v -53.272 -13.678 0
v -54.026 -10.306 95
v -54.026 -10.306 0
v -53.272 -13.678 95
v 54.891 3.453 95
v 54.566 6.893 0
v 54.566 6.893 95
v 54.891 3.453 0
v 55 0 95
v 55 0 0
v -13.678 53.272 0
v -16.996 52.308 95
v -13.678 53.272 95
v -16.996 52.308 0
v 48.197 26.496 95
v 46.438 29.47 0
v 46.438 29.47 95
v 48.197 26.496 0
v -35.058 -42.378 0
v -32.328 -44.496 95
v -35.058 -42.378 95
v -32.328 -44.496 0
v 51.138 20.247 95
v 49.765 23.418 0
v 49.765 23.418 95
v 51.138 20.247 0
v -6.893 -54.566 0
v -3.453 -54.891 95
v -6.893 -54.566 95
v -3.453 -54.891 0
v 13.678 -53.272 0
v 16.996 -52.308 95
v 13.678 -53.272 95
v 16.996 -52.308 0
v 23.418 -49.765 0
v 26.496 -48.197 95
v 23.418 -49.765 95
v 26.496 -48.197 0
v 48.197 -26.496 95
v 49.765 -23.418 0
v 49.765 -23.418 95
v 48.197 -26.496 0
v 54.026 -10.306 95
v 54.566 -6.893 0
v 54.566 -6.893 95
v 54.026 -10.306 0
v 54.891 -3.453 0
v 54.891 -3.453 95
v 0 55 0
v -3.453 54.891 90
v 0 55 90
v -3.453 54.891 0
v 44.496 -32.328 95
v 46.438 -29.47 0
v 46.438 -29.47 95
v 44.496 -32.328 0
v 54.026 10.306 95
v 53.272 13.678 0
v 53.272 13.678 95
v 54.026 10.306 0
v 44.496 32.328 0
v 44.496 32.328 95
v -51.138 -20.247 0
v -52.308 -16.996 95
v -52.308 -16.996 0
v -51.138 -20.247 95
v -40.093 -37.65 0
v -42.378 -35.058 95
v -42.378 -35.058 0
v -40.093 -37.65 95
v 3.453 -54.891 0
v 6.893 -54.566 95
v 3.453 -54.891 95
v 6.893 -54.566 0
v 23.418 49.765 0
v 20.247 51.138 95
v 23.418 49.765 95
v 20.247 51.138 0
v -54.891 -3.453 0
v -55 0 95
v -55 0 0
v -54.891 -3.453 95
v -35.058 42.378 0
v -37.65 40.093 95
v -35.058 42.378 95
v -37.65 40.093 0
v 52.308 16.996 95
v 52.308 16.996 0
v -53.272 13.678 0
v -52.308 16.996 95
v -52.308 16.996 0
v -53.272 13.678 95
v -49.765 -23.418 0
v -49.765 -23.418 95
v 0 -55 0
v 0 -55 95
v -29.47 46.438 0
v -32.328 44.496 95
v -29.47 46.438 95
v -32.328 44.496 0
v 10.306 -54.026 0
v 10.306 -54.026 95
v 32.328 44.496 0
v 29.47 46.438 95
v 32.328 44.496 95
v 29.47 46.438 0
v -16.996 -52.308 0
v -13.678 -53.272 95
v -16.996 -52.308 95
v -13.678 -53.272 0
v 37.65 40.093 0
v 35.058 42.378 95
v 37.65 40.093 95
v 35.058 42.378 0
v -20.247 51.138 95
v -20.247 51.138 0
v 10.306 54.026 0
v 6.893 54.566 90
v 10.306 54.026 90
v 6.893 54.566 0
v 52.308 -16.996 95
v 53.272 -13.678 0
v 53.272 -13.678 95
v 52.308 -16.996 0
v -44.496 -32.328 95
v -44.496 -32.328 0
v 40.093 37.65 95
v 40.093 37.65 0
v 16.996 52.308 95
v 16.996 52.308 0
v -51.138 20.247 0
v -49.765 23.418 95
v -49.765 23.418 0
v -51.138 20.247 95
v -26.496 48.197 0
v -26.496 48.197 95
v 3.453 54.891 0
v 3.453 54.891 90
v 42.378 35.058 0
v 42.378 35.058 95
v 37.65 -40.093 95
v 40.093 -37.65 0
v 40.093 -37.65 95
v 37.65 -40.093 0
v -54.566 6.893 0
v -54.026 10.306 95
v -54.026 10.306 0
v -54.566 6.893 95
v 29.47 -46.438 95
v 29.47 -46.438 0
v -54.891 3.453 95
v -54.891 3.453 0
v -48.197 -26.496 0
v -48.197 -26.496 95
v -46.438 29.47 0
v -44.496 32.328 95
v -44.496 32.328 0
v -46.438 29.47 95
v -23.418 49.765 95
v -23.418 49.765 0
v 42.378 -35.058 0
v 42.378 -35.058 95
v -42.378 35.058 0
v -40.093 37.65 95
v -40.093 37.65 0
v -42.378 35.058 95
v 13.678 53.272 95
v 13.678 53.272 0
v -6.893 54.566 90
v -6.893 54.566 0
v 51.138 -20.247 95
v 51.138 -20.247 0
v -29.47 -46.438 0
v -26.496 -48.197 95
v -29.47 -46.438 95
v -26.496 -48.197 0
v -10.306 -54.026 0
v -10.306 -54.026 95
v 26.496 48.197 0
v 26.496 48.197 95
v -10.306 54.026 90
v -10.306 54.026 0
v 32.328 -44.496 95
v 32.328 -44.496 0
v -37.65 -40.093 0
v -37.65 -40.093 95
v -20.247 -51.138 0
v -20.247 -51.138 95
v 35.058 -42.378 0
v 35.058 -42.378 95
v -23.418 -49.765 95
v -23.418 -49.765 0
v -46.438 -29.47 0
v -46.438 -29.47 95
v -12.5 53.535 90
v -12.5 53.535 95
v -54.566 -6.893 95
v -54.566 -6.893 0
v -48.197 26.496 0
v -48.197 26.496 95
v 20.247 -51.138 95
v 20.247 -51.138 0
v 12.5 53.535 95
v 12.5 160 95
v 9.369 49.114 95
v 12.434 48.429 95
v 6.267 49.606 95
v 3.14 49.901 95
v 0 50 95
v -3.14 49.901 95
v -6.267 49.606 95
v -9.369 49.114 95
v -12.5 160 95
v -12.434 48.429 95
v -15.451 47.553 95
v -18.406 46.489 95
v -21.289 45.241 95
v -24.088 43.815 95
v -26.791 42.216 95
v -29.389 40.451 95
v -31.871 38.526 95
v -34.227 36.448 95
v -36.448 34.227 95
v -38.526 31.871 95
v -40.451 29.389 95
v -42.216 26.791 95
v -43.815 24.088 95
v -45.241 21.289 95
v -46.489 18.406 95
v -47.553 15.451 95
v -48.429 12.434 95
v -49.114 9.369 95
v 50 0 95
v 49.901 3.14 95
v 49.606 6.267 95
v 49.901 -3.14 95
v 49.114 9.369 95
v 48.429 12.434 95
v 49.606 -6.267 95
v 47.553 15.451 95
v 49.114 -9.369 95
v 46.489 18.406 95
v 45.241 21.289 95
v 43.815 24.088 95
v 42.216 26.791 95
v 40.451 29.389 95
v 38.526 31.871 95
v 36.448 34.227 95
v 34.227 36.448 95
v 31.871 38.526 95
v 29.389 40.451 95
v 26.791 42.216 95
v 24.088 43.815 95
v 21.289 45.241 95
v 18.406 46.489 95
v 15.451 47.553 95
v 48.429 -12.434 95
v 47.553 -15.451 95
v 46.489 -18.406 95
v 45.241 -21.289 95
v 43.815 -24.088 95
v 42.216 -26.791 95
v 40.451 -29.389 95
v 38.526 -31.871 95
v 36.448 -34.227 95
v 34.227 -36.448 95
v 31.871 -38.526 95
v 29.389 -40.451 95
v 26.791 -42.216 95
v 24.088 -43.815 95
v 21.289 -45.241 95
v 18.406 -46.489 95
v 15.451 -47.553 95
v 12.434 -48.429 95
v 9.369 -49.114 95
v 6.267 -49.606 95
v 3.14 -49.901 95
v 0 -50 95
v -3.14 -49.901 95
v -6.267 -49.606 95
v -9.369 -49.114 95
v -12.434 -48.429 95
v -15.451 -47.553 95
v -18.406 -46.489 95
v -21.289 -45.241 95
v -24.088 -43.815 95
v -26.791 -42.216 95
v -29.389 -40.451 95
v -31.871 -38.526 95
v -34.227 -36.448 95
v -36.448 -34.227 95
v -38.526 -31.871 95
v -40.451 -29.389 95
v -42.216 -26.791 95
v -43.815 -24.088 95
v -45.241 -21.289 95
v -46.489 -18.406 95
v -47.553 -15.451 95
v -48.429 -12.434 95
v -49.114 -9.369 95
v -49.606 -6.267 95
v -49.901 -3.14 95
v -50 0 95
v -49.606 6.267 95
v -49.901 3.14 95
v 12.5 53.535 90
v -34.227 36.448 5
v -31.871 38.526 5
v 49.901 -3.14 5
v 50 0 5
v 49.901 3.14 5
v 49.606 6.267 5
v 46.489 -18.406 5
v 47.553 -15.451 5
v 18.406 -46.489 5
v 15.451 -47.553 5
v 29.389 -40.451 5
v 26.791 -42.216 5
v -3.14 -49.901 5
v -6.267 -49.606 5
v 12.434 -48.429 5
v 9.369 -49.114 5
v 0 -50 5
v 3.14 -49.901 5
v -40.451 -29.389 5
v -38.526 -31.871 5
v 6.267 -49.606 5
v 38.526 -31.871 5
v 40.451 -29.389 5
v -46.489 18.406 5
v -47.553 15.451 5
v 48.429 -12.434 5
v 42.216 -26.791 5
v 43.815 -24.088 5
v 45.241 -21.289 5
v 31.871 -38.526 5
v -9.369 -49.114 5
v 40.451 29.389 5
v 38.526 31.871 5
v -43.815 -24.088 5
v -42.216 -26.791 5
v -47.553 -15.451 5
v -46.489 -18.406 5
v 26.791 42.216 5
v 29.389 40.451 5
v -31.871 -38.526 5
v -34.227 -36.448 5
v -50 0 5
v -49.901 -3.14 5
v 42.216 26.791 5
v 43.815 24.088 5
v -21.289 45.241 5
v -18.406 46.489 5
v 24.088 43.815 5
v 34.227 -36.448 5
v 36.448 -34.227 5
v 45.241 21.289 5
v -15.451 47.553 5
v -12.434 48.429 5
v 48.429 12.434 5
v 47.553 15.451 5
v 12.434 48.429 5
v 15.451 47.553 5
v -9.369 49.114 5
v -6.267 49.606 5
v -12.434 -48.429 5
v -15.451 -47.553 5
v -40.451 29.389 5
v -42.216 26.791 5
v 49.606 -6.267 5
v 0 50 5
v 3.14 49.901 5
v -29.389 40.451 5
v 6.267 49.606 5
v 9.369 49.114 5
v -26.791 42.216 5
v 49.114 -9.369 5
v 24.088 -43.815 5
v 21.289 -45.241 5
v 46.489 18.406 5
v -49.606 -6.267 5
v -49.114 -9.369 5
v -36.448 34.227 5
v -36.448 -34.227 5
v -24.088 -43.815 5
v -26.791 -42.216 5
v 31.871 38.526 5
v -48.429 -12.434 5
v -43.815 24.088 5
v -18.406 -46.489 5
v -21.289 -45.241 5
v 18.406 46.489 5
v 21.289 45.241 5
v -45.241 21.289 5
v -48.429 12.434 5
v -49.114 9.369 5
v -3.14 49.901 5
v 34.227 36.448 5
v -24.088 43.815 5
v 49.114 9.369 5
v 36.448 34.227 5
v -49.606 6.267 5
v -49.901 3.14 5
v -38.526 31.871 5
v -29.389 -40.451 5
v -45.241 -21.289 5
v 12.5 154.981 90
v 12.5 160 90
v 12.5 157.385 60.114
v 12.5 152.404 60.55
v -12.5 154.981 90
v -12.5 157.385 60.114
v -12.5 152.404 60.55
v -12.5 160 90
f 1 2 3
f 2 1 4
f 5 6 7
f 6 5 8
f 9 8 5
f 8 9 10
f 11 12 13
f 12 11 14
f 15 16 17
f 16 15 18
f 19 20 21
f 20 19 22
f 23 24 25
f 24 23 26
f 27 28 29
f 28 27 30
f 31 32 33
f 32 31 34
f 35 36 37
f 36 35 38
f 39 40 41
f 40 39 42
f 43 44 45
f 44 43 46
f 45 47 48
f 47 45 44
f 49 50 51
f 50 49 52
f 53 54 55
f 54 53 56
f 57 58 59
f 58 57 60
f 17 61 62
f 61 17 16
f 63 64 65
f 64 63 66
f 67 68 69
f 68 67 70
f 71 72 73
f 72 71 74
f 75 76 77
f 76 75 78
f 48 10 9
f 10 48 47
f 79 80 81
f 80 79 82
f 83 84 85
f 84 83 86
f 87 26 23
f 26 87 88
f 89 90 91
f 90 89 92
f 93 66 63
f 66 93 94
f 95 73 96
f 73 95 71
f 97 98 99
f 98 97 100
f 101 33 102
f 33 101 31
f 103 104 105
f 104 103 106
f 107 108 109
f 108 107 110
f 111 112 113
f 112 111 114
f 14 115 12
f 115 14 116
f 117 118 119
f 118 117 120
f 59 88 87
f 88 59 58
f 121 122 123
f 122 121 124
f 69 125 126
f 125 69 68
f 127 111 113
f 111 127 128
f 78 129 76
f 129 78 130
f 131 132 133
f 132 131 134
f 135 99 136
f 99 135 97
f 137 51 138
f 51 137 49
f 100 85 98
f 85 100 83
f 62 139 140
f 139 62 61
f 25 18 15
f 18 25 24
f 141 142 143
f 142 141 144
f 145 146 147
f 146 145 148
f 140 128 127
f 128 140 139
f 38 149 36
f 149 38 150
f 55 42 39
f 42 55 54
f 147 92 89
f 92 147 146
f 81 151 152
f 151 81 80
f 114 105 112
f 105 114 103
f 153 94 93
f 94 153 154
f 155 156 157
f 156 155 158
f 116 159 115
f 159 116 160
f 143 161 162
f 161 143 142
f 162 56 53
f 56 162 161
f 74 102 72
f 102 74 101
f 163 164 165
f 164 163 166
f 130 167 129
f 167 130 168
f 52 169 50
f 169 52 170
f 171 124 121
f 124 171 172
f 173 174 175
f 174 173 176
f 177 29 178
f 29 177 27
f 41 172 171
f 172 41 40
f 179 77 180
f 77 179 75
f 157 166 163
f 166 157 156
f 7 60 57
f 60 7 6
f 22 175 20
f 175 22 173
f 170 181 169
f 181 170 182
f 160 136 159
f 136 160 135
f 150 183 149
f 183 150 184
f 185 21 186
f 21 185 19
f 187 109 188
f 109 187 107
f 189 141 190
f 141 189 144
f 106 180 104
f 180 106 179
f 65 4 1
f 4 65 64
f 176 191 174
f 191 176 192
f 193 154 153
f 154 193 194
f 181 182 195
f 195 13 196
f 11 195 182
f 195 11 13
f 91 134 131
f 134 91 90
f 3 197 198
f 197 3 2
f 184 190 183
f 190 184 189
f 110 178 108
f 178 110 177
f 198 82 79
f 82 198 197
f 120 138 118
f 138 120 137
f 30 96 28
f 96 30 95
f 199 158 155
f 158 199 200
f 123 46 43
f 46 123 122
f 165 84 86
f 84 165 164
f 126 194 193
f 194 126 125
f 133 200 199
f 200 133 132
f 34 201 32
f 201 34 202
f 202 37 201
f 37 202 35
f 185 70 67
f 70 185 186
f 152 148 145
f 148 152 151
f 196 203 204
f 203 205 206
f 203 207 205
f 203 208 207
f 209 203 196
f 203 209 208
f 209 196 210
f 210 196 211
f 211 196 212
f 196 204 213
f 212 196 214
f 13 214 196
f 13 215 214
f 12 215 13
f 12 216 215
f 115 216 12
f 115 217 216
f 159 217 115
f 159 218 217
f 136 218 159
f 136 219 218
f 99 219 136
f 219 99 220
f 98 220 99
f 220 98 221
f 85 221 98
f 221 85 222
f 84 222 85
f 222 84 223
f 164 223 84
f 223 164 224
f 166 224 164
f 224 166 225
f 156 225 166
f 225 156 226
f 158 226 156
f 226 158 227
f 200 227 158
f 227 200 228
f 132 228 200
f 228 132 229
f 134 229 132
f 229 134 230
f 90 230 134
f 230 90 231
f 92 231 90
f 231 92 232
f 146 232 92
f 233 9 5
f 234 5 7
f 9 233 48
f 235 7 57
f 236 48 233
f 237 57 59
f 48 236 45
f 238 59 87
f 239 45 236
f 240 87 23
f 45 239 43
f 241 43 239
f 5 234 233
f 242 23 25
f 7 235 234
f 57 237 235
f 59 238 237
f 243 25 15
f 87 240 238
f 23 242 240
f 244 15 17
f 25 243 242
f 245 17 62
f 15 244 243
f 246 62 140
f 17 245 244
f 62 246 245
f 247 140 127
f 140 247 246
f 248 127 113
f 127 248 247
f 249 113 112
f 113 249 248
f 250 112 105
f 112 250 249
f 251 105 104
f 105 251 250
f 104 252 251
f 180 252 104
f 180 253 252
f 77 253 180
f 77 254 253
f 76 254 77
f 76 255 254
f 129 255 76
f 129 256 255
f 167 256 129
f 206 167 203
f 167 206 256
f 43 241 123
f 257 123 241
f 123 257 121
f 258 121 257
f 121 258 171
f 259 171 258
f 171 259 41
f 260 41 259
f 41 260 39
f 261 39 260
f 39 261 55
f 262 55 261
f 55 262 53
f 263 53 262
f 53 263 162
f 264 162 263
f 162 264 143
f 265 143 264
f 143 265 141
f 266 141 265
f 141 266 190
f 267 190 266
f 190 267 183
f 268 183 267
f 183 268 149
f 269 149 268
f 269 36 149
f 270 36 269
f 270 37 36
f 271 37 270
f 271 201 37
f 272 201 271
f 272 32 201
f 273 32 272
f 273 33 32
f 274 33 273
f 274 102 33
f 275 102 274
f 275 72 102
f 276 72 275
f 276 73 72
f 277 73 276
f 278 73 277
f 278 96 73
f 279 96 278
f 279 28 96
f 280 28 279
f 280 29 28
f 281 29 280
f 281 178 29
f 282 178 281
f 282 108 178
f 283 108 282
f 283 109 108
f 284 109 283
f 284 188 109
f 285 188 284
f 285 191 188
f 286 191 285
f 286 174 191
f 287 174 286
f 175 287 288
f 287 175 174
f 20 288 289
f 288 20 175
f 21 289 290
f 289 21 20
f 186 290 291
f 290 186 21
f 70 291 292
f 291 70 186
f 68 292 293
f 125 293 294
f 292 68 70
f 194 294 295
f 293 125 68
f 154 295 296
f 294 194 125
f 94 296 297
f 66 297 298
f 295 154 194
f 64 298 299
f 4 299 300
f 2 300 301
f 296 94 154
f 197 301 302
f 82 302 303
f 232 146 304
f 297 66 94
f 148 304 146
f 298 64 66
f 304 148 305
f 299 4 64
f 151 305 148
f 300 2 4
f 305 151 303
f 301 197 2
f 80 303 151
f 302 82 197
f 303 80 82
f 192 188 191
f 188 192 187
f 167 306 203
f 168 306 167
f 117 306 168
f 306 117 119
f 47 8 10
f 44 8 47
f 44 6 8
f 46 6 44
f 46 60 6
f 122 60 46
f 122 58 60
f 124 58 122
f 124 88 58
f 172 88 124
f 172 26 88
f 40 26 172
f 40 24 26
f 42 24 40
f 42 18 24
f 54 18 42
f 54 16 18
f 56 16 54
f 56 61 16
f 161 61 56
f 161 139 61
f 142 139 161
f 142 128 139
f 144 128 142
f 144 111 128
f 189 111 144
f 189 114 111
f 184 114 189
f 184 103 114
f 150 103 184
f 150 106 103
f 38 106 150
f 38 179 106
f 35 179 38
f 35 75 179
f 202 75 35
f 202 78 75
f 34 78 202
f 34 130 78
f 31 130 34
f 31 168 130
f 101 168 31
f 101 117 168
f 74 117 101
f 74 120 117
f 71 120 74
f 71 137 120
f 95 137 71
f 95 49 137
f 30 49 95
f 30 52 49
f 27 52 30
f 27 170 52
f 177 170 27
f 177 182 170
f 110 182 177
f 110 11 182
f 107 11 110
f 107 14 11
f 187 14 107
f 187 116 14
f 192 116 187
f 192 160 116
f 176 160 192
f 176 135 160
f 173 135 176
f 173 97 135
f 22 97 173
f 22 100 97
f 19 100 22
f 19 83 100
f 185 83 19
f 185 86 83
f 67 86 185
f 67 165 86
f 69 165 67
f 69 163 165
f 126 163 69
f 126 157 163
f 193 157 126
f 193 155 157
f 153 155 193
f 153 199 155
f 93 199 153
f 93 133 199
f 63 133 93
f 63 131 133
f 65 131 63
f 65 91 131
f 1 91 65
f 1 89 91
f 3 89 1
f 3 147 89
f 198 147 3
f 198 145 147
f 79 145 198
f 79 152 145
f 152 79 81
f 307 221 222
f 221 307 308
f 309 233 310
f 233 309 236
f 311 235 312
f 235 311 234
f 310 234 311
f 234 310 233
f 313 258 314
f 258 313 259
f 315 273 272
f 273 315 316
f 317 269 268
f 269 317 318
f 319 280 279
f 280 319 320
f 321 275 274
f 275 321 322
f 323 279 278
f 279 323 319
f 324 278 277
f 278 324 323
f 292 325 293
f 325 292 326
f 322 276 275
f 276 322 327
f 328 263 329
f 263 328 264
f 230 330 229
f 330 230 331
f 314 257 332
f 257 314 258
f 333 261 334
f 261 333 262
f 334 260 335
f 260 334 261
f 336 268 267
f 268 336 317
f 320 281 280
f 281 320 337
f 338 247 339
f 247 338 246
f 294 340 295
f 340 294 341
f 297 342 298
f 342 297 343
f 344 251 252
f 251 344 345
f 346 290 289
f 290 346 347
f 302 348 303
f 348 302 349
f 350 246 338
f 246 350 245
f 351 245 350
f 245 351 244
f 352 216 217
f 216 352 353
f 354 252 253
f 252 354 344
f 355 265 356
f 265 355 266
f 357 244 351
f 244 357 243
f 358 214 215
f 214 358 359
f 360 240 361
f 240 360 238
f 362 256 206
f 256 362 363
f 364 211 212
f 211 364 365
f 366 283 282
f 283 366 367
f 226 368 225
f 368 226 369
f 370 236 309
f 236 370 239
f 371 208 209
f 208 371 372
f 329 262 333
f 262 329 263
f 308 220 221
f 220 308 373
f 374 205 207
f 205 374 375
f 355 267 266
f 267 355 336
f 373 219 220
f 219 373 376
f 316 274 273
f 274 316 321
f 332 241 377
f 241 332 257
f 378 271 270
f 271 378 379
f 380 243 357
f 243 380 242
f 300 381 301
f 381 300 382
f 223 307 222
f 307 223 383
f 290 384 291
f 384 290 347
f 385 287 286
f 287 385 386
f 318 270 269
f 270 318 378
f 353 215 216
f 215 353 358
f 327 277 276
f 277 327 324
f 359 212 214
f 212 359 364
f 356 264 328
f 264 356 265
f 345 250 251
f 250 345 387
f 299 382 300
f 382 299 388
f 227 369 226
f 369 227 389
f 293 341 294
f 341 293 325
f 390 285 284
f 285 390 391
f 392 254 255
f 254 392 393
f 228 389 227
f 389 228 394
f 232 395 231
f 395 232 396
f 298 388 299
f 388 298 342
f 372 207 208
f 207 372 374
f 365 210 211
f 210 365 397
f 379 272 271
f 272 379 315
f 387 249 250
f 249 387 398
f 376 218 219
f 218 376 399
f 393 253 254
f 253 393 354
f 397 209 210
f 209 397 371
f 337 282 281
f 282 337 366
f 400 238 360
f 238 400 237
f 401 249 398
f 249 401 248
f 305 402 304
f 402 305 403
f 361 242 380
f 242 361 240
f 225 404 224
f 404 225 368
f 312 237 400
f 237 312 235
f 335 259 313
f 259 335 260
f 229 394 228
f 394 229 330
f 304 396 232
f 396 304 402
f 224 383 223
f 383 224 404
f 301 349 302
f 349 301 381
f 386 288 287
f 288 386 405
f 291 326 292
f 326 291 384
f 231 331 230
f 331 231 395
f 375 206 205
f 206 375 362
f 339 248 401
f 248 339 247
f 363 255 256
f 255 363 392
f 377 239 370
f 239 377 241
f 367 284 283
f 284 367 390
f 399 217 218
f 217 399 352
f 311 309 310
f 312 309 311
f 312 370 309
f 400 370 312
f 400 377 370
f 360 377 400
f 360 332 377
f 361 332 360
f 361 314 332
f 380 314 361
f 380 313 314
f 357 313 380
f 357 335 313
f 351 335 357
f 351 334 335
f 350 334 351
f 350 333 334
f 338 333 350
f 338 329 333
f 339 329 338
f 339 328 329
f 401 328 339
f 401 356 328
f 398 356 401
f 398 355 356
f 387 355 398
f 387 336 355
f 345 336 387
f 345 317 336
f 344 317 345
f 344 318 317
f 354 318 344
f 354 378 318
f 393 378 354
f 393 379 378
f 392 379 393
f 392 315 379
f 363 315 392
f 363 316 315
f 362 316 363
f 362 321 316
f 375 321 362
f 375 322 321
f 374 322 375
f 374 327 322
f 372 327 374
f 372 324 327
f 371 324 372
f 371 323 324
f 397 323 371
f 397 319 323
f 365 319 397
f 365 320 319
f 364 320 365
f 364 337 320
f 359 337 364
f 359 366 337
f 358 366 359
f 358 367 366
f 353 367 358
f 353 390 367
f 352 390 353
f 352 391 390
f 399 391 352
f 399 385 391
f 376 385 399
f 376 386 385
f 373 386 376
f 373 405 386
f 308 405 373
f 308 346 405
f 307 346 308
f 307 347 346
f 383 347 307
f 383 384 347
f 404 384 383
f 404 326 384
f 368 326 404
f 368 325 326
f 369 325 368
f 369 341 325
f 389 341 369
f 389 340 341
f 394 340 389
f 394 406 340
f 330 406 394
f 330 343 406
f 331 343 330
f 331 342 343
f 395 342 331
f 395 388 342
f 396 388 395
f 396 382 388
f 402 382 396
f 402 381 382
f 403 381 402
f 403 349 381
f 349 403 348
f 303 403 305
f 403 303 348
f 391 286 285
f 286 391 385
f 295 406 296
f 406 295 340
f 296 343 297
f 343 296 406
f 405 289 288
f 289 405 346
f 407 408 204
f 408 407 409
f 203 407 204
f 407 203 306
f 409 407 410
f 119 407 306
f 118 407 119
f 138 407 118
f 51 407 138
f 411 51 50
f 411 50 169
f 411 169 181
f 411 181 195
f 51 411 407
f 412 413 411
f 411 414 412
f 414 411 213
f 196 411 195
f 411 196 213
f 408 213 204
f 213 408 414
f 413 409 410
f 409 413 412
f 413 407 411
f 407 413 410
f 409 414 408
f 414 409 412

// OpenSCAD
// - Half of the width of the inside of the cup (mm)
cupRadius=50; // [1:999]
// - Dpeth of the inside (mm)
cupDepth=90; // [1:999]
// - The width of the arm of the couch (mm)
handleDepth=105; //[1:999]
// - How thick to make the cup holder wall (mm)
wallThickness=5; // [.01:999]
// - How thick to make the handle wall (mm)
handleThickness=5; // [.01:999]
// - How long to make the clip (mm)
clipLength=30; // [1:999]
// - The angle of the clip (mm)
clipAngle=5; // [1:89]

/* [Hidden] */
$fn=100;

module inner_cup() {
  translate([0, 0, wallThickness]) {
      // plus one for preview
      cylinder(cupDepth +  1, cupRadius, cupRadius);
  }
}

module cup_holder() {
  difference() {
    outer_cupDepth=cupDepth + wallThickness;
    outer_cupRadius=cupRadius + wallThickness;
    cylinder(outer_cupDepth, outer_cupRadius, outer_cupRadius);

    inner_cup();
  }
}

module handle() {
    difference() {
      translate([-cupRadius/4, 0, cupDepth]) {
        cube([cupRadius/2, handleDepth + cupRadius + wallThickness, handleThickness]);
      }

      inner_cup();
    }
}

module clip() {
  translate([-cupRadius/4, handleDepth + cupRadius + wallThickness, cupDepth]) {
    rotate([- clipAngle - 180 , 0, 0]) {
      cube([cupRadius/2, handleThickness, clipLength]);
    }
  }
}

union() {
  cup_holder();
  handle();
  clip();
}
